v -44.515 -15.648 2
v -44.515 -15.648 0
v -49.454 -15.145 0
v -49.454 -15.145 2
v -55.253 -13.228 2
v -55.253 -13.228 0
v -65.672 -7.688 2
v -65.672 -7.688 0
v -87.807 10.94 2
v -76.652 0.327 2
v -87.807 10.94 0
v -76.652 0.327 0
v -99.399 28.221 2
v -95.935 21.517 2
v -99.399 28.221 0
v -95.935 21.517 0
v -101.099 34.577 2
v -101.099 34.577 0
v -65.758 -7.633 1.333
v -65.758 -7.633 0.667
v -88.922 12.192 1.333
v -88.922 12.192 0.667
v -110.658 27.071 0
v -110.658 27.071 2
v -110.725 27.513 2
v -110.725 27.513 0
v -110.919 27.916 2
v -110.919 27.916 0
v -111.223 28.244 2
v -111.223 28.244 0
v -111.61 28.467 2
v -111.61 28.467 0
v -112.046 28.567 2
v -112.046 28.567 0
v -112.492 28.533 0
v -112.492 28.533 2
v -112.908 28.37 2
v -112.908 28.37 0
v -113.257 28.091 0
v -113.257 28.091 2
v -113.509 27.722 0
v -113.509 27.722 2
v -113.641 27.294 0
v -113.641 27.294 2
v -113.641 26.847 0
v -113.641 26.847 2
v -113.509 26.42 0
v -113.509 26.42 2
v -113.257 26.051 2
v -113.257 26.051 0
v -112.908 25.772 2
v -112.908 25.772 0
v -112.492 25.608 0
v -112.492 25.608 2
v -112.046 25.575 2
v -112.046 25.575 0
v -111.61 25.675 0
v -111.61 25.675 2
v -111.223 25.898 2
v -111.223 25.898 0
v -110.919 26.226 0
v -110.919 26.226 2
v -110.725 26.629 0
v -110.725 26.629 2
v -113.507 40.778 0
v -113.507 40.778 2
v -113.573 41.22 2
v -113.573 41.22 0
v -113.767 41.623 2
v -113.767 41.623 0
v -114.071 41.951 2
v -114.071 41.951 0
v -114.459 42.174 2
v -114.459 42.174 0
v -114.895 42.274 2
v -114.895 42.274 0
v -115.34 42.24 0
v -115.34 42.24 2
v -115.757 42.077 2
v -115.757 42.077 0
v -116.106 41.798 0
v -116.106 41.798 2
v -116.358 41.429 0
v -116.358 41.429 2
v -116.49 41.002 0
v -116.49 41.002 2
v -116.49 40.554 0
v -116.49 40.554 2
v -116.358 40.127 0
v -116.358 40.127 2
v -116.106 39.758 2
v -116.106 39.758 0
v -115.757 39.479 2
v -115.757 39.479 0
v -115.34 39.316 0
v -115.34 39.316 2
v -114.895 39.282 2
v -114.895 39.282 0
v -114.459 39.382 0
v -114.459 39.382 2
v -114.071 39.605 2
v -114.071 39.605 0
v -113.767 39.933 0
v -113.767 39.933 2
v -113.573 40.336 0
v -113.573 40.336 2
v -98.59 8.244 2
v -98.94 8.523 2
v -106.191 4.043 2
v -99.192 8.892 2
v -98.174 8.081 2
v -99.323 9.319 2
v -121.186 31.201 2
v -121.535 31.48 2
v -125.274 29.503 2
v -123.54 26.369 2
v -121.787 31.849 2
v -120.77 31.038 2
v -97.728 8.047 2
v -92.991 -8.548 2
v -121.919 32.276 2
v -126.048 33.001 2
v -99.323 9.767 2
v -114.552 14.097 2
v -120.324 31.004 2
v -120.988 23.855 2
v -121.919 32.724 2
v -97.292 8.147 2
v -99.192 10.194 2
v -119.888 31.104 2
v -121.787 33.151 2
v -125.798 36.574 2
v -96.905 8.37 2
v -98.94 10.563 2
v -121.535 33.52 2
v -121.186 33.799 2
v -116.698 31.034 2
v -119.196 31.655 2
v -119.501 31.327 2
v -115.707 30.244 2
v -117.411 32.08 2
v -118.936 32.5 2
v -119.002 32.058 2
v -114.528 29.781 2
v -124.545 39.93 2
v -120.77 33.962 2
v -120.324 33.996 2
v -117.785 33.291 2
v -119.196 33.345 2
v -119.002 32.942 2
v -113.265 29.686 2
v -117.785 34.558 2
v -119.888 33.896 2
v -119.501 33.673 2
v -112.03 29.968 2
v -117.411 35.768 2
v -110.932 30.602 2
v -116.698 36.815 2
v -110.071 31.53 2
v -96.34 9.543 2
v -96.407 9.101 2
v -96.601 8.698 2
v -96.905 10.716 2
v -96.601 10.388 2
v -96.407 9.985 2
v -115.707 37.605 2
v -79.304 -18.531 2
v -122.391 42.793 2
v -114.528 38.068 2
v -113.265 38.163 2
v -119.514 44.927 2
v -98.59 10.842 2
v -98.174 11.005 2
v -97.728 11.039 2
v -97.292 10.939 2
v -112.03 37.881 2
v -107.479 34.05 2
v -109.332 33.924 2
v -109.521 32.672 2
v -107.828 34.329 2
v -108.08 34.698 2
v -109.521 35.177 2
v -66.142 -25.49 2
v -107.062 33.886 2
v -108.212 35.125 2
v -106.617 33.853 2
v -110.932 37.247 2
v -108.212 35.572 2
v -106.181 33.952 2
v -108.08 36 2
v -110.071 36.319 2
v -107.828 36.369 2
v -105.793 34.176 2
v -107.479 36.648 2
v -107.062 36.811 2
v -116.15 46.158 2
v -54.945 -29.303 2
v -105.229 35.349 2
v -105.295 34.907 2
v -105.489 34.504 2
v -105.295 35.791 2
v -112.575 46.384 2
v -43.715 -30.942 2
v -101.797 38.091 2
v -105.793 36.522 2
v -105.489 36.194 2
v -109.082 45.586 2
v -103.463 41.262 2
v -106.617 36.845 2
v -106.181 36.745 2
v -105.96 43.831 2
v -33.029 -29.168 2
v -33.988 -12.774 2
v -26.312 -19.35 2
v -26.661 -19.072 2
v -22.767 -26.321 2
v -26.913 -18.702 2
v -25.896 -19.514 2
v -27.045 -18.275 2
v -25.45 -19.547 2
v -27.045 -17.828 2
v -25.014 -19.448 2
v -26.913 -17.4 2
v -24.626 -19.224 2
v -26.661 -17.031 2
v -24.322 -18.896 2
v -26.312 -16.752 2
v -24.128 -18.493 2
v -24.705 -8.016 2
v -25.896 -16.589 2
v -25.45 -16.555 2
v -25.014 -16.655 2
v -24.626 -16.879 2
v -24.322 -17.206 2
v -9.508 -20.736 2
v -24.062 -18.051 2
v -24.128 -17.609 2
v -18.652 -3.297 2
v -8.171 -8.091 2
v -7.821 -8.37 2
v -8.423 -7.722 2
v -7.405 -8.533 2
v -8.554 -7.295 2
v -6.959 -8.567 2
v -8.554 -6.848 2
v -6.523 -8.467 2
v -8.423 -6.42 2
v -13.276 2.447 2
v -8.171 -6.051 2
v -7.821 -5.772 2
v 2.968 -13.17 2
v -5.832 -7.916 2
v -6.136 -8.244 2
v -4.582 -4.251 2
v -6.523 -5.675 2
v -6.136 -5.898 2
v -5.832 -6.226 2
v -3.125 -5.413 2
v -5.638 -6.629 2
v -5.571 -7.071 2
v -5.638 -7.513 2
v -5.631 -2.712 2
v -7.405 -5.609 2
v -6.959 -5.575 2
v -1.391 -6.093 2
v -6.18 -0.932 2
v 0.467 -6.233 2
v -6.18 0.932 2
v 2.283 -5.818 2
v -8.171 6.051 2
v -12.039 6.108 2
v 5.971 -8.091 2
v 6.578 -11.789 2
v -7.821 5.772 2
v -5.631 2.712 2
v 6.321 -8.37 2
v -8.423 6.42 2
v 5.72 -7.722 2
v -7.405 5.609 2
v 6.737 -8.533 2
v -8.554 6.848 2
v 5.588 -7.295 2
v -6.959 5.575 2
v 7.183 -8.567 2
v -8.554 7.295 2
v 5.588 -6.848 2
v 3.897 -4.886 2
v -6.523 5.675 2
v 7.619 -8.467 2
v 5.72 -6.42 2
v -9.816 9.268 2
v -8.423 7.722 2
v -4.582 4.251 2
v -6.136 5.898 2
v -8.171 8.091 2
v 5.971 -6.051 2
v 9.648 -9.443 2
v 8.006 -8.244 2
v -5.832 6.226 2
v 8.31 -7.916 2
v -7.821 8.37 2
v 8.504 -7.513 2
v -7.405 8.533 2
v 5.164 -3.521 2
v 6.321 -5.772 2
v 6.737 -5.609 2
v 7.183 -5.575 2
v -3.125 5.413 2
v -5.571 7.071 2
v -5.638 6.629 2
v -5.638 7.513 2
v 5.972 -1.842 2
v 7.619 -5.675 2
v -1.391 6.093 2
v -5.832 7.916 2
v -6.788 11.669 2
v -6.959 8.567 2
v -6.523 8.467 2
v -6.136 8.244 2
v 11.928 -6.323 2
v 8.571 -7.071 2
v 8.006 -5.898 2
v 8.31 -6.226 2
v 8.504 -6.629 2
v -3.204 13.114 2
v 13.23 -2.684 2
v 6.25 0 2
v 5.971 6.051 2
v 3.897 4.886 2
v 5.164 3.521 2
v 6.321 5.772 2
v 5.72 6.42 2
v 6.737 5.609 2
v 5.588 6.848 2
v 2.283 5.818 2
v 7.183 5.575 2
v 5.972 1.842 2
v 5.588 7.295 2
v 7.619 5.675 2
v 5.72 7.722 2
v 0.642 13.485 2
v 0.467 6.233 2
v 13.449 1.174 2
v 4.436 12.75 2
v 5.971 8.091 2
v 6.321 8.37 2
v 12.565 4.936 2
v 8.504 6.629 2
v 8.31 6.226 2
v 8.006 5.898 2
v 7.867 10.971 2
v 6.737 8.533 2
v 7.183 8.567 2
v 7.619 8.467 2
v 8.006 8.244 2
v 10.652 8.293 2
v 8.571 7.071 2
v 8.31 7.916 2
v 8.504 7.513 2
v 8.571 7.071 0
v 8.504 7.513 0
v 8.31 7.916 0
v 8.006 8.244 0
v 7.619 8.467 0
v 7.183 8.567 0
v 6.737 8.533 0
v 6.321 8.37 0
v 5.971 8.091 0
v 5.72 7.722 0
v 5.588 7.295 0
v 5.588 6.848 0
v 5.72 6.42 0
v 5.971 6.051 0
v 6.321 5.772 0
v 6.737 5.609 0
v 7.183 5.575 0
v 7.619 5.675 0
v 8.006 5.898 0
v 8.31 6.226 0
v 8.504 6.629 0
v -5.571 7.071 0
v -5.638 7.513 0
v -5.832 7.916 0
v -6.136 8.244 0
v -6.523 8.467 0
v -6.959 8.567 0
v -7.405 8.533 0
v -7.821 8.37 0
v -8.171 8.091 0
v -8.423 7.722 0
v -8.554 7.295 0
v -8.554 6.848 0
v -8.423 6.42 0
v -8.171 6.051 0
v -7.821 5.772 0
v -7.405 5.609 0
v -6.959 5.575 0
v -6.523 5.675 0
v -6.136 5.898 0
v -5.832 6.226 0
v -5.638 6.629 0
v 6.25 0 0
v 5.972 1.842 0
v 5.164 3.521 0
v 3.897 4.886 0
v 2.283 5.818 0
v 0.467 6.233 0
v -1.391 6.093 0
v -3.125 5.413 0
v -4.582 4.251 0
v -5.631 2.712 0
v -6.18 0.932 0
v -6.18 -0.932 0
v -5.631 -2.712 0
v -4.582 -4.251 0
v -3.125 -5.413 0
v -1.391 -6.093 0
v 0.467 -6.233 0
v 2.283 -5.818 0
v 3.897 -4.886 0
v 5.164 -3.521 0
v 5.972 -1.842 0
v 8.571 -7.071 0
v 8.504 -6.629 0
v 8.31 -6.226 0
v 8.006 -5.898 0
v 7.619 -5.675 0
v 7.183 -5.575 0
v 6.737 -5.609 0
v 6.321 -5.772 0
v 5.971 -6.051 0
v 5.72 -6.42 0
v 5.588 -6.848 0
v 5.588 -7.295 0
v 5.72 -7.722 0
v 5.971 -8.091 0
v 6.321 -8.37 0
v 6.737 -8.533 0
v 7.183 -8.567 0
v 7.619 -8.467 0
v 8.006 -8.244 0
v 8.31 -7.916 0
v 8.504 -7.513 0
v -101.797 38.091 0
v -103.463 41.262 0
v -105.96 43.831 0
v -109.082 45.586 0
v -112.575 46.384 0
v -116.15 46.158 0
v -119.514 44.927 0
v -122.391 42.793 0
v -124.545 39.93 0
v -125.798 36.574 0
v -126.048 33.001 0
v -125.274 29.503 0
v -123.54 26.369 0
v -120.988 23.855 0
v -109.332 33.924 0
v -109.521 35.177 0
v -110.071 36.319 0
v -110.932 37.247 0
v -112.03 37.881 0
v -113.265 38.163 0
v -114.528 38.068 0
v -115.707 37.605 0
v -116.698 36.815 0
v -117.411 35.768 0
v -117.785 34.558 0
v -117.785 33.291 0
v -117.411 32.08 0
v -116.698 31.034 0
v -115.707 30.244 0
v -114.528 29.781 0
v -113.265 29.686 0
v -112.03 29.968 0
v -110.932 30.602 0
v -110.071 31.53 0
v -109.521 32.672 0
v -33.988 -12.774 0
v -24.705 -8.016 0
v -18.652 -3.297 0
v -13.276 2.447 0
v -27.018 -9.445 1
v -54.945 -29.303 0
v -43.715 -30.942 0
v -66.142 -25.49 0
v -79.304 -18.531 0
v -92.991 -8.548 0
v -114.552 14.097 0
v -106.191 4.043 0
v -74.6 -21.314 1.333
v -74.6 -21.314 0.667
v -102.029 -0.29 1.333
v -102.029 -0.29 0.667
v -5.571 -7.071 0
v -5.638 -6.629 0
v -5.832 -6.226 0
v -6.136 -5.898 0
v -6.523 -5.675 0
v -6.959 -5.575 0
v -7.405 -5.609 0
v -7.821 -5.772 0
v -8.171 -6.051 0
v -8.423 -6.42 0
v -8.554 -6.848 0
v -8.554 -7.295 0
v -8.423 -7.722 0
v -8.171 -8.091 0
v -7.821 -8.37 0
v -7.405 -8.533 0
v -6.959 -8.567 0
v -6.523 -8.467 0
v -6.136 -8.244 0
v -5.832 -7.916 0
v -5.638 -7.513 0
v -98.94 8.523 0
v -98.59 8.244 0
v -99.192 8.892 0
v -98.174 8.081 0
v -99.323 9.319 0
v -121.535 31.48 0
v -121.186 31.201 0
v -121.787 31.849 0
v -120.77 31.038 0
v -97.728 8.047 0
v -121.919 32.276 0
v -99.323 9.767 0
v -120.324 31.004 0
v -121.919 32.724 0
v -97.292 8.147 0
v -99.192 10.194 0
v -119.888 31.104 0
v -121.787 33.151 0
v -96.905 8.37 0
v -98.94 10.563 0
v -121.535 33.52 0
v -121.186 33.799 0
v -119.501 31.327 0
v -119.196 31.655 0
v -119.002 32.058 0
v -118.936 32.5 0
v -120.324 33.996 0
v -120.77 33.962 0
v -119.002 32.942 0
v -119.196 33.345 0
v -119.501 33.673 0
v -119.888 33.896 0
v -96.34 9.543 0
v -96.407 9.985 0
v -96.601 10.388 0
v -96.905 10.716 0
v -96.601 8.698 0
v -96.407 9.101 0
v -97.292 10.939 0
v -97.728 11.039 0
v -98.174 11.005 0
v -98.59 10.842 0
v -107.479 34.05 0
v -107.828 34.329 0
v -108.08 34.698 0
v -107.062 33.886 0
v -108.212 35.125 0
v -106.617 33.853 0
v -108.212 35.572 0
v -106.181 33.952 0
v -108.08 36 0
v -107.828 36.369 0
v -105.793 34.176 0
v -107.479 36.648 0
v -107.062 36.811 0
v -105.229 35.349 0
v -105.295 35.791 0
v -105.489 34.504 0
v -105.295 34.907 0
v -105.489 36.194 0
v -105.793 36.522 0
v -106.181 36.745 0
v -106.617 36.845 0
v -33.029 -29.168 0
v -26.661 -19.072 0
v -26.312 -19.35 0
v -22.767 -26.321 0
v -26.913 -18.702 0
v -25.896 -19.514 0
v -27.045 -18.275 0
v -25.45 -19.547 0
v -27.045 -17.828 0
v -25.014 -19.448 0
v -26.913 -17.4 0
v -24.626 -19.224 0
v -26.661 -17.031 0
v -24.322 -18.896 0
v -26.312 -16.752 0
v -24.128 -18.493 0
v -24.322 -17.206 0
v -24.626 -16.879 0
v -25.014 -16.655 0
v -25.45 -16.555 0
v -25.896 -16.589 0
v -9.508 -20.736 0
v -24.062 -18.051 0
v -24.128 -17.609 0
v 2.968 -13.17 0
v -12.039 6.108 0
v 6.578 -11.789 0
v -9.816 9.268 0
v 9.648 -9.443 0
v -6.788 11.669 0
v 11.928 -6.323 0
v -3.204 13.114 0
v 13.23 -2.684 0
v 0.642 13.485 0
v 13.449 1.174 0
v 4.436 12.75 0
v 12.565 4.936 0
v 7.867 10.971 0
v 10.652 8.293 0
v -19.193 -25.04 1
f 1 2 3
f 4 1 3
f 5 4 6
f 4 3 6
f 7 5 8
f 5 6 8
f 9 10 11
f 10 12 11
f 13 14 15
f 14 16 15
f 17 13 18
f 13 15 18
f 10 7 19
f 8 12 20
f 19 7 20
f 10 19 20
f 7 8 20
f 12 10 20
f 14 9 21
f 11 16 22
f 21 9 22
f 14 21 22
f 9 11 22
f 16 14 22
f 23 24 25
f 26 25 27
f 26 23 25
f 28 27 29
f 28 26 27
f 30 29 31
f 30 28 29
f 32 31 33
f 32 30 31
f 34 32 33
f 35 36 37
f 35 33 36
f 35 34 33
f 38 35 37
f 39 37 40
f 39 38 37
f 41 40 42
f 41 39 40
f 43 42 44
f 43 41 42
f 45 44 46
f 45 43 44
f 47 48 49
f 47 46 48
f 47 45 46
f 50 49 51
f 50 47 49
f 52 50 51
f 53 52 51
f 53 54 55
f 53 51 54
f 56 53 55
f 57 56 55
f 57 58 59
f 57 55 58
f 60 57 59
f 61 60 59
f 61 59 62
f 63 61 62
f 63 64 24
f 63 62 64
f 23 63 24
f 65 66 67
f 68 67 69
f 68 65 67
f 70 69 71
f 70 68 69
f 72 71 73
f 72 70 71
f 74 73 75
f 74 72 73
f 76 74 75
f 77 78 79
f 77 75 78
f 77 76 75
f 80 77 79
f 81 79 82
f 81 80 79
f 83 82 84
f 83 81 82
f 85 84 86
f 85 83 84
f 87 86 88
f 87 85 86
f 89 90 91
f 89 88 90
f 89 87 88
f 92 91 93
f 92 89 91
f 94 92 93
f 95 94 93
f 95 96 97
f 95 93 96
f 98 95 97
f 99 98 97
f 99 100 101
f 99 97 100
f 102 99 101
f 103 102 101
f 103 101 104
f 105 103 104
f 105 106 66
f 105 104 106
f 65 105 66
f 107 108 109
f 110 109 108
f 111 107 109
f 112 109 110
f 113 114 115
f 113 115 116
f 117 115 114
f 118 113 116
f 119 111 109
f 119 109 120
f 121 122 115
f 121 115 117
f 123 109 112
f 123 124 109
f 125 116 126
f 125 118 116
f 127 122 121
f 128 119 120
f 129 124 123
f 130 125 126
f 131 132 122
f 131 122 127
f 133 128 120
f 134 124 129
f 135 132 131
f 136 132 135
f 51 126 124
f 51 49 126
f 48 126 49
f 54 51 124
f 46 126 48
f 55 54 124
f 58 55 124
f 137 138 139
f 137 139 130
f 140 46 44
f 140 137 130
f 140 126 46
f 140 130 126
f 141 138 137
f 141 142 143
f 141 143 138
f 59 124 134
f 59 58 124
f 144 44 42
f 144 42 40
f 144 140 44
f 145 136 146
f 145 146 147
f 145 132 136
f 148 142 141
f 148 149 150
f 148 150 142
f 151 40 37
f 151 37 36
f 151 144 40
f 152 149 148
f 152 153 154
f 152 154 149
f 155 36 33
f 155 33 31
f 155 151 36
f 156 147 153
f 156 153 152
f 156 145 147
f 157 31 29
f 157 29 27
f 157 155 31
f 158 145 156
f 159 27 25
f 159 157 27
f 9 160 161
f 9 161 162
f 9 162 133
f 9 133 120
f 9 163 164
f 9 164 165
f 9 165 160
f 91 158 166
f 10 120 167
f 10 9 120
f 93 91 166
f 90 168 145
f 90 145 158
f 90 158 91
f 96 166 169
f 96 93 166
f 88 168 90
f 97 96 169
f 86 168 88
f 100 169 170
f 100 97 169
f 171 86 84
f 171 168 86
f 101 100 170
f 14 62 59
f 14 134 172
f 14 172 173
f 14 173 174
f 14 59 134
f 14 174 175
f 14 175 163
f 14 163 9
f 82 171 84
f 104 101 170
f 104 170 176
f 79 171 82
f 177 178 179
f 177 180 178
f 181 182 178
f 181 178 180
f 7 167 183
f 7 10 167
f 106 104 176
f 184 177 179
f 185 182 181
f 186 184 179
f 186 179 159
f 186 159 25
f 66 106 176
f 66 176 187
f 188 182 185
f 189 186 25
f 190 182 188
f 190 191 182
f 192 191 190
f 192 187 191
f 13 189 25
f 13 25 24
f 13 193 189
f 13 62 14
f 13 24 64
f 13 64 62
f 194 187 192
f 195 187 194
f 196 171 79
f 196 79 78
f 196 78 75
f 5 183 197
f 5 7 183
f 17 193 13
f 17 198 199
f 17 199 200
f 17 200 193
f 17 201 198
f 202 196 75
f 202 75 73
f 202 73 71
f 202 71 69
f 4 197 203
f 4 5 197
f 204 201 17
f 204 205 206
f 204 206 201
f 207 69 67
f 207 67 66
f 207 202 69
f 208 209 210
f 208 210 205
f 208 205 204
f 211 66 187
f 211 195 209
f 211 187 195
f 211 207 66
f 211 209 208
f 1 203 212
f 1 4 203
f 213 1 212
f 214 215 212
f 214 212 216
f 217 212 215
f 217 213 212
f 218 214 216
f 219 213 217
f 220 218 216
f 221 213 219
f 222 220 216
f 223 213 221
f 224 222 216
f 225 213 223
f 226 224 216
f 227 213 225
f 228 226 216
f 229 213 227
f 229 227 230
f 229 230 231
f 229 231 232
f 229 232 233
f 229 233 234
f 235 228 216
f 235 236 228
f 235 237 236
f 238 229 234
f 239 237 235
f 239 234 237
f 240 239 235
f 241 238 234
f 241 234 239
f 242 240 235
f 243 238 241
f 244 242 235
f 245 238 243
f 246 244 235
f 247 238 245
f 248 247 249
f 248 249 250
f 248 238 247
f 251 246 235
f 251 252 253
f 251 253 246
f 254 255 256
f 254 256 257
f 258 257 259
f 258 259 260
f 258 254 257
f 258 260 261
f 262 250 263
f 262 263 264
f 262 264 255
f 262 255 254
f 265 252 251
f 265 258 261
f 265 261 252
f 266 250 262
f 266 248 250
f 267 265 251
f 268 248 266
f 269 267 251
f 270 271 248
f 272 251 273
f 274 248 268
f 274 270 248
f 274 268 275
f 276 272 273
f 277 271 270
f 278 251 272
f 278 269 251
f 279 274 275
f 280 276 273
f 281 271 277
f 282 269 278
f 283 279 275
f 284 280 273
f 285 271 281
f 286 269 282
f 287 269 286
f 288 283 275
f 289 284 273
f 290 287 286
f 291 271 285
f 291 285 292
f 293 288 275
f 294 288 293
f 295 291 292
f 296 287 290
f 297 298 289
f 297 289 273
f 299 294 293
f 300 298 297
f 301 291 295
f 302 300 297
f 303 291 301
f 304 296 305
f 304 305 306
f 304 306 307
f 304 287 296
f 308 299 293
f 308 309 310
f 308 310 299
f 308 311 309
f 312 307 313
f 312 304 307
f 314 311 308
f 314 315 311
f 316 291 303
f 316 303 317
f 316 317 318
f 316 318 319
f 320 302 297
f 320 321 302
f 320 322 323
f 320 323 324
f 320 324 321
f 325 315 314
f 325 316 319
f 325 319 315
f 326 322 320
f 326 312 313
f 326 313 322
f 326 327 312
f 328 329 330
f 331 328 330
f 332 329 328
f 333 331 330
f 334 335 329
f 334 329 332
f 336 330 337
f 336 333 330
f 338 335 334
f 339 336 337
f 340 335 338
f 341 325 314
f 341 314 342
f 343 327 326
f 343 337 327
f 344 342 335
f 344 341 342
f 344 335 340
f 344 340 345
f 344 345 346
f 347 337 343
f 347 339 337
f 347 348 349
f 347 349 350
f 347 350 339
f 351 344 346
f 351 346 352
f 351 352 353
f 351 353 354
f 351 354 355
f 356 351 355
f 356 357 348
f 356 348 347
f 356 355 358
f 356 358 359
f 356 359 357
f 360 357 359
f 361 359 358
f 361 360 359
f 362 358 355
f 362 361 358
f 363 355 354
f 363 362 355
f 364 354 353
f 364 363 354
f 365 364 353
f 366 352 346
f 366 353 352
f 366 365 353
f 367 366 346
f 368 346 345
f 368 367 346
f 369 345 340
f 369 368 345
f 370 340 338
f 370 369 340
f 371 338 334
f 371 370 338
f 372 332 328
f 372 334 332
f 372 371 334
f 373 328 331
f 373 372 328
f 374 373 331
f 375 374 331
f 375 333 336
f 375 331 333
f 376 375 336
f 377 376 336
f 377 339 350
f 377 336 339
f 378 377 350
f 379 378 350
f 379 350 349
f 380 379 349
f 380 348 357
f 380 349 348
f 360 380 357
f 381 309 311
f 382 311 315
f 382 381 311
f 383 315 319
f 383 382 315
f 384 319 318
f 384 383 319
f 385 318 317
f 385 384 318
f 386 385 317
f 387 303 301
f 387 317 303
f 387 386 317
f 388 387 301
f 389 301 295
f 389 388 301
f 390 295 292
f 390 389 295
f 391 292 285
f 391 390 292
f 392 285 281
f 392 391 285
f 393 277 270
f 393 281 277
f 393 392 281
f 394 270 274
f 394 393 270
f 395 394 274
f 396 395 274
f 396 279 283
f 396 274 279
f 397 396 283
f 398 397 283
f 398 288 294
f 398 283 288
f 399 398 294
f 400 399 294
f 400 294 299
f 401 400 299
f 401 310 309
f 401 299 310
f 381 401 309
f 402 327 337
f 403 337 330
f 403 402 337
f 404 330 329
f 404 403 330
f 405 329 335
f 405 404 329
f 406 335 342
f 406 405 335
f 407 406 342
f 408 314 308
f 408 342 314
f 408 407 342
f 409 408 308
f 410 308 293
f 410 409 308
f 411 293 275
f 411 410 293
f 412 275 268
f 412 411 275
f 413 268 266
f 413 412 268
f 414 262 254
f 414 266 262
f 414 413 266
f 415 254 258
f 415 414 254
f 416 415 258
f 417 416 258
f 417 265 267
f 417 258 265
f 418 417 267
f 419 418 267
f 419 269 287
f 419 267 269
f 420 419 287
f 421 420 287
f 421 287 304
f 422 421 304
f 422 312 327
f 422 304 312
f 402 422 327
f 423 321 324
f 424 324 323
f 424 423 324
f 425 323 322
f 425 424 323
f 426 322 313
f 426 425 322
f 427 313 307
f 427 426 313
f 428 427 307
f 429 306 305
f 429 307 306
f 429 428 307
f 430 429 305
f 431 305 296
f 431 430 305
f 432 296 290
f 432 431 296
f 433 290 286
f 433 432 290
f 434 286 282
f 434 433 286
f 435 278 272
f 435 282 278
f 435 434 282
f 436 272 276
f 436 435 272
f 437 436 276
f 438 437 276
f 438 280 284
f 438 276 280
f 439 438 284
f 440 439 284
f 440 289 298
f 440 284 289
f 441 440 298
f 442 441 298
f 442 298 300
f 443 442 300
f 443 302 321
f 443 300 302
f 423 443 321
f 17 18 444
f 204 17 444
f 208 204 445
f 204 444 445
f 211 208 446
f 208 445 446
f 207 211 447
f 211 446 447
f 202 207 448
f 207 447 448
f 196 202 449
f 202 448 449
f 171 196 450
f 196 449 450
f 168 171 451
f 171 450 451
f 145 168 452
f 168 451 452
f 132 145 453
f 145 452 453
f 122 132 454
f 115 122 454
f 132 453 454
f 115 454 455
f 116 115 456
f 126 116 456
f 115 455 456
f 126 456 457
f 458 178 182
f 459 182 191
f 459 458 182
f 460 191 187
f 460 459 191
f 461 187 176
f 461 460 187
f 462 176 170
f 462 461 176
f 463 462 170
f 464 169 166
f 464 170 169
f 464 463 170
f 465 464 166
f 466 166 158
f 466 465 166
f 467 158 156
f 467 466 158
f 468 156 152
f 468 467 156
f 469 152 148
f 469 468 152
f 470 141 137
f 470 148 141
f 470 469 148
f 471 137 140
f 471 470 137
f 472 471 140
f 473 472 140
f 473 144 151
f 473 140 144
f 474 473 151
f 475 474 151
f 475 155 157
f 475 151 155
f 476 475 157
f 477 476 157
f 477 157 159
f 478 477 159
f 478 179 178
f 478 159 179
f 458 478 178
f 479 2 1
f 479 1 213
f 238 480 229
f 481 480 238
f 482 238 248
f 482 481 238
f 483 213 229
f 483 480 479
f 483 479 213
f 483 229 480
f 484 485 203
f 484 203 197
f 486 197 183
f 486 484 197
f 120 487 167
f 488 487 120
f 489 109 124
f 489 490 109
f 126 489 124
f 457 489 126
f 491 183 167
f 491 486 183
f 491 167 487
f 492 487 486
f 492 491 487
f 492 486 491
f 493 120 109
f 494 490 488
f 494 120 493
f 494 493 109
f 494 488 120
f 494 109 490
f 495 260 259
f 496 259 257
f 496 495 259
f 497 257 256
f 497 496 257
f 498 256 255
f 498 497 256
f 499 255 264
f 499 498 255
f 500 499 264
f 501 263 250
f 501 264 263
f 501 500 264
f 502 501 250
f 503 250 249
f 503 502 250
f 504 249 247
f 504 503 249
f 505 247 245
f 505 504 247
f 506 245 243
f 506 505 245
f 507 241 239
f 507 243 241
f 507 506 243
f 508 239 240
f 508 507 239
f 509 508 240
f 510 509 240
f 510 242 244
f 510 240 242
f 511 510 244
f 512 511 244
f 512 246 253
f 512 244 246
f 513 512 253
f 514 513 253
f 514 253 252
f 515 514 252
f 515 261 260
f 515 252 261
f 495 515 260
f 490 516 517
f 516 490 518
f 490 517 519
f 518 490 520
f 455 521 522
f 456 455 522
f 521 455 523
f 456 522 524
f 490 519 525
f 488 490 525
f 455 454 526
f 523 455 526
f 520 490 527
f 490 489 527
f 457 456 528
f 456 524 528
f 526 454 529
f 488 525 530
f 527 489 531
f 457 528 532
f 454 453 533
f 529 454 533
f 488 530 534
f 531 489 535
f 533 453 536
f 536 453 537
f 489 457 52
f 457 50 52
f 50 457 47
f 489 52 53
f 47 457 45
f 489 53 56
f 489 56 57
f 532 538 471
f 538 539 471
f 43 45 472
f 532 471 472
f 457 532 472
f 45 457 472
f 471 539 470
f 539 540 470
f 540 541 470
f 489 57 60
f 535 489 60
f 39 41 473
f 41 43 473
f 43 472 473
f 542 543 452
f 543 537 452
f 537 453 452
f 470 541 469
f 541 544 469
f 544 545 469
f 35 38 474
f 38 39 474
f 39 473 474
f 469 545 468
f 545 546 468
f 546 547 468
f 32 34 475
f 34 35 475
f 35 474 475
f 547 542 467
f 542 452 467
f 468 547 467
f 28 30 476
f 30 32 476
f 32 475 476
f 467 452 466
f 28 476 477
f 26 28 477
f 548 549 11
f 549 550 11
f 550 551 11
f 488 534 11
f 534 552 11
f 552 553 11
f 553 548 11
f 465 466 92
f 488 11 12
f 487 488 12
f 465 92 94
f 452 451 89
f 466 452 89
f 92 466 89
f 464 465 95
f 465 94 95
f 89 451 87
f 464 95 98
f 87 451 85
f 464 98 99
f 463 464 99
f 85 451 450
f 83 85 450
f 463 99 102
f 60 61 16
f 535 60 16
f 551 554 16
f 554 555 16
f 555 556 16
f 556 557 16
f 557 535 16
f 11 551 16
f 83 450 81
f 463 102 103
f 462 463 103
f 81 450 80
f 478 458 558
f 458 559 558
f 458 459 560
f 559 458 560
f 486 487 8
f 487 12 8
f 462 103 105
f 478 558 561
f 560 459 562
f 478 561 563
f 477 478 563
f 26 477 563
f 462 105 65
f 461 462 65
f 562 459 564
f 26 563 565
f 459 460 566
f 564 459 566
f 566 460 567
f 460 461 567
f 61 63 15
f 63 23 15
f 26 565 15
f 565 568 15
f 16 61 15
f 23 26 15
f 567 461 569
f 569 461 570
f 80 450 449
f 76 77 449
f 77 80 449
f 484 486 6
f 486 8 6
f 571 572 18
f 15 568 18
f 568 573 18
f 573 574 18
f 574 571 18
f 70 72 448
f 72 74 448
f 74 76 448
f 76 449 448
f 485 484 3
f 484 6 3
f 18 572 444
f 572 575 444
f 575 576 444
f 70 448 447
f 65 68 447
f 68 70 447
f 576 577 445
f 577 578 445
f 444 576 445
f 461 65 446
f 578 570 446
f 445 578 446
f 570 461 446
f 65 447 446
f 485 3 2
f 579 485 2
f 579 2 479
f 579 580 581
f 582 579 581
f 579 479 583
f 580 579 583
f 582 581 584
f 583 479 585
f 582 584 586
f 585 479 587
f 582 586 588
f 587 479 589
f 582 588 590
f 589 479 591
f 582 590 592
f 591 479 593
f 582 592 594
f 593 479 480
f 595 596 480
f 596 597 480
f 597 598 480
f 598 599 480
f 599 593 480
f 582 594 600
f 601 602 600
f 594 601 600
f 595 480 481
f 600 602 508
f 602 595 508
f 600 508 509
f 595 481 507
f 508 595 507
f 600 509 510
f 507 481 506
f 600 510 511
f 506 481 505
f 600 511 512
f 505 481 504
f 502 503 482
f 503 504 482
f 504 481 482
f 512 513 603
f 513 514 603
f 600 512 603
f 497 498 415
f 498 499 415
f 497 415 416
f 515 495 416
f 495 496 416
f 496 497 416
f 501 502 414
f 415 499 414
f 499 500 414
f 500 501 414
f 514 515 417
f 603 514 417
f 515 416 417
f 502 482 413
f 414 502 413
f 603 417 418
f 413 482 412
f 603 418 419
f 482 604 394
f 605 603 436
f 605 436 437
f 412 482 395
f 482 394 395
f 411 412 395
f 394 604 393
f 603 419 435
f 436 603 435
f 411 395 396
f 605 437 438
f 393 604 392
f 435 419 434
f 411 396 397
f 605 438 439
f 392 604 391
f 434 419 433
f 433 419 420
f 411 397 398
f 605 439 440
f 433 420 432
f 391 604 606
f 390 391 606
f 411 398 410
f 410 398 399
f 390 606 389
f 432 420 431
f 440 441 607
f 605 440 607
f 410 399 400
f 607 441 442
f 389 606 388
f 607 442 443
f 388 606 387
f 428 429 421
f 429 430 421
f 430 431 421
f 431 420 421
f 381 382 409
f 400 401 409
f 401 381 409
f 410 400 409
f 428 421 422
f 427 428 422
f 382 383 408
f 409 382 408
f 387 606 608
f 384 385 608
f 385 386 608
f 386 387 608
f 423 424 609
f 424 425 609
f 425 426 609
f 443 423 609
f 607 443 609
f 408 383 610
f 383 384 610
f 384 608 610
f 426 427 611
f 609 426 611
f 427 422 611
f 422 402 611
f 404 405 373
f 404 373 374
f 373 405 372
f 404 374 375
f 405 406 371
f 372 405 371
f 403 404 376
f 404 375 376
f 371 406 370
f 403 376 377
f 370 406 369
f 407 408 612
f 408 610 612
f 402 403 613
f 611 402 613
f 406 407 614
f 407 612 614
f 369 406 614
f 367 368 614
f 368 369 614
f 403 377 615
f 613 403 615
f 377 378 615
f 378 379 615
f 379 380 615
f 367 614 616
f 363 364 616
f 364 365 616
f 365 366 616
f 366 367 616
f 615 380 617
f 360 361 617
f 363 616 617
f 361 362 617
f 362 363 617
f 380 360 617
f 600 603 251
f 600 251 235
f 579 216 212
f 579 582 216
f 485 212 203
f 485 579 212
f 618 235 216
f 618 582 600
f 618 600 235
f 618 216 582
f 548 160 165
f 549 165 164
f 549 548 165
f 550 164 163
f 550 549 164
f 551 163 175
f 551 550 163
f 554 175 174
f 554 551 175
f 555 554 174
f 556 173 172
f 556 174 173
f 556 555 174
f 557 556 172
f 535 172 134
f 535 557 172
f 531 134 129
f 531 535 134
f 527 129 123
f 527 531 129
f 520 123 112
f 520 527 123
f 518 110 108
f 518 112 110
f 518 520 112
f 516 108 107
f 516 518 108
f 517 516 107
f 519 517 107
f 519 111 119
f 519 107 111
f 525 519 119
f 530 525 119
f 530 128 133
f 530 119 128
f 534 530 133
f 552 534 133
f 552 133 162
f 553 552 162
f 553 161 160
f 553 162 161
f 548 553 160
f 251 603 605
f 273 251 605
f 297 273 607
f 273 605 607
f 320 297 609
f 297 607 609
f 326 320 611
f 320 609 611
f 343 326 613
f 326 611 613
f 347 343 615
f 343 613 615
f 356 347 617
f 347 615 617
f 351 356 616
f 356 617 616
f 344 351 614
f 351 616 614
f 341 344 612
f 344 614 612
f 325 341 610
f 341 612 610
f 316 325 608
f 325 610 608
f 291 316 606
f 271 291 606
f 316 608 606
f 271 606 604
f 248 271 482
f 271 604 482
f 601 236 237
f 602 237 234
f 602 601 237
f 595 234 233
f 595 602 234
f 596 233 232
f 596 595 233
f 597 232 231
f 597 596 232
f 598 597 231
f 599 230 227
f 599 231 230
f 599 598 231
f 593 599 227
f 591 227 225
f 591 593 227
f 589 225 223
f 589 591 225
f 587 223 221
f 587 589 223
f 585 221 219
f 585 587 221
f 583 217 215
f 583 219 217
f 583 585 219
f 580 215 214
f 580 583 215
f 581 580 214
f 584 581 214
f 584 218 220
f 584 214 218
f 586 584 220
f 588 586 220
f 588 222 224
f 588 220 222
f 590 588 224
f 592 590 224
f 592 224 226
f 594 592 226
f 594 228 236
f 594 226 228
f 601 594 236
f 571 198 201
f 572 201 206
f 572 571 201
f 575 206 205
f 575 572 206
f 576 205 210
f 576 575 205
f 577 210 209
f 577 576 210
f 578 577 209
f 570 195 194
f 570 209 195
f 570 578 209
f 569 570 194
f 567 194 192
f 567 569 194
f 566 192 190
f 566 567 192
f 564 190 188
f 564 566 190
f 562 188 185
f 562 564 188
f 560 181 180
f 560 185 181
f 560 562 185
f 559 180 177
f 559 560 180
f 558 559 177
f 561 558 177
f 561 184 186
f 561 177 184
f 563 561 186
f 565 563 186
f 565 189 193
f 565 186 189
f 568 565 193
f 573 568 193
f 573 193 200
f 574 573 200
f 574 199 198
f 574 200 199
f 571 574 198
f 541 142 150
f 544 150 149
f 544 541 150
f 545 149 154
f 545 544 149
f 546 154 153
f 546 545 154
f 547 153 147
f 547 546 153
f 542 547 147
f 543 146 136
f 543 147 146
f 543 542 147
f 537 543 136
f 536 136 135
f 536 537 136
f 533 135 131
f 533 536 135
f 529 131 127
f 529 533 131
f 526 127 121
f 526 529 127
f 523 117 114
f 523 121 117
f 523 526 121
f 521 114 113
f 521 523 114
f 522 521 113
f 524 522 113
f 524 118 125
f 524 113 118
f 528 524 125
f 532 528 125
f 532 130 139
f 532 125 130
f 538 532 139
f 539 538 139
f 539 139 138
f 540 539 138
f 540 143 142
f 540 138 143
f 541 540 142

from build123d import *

# Parameters (mm, degrees)
SKETCH_1_R          = 13.5
EXTRUDE_1_DEPTH     = 2
SKETCH_2_R          = 6.25
SKETCH_2_R_2        = 1.5
SKETCH_2_R_3        = 4.25
CUT_EXTRUDE_2_DEPTH = 135.372484569
SKETCH_3_R          = 1.5
CUT_EXTRUDE_3_DEPTH = 135.372484569


with BuildPart() as part:
    # 草图1 → 凸台-拉伸1 (new body)
    with BuildSketch(Plane.XY):
        Circle(SKETCH_1_R)
        with BuildLine():
            ThreePointArc((5.892711217, -11.0238811), (8.326059469, 9.323450741), (-11.617581648, 4.613219771))
            add(Edge.make_bspline(
                [(-44.514894976, -15.648119029), (-23.754992487, -12.049932399), (-11.617581648, 4.613219771)],
                knots=[0, 0, 0, 1, 1, 1], degree=2))
            add(Edge.make_bspline(
                [(-44.514894976, -15.648119029), (-60.493246192, -16.620966096), (-98.719374485, 13.99401616), (-101.099323327, 34.577284328)],
                knots=[0, 0, 0, 0, 1, 1, 1, 1], degree=3))
            ThreePointArc((-101.099323327, 34.577284328), (-119.514224633, 44.92723863), (-120.988196928, 23.854565571))
            add(Edge.make_bspline(
                [(-43.715031798, -30.941916126), (-74.6558876, -29.772176263), (-107.934743734, 0.909272839), (-120.988196928, 23.854565571)],
                knots=[0, 0, 0, 0, 1, 1, 1, 1], degree=3))
            add(Edge.make_bspline(
                [(5.892711217, -11.0238811), (-16.208282922, -27.819747246), (-43.715031798, -30.941916126)],
                knots=[0, 0, 0, 1, 1, 1], degree=2))
        make_face()
    extrude(amount=EXTRUDE_1_DEPTH)

    # 草图2 → 切除-拉伸2 (cut, through all)
    with BuildSketch(Plane.XY):
        Circle(SKETCH_2_R)
        with Locations((-7.071067812, 7.071067812)):
            Circle(SKETCH_2_R_2)
        with Locations((7.071067812, 7.071067812)):
            Circle(SKETCH_2_R_2)
        with Locations((7.071067812, -7.071067812)):
            Circle(SKETCH_2_R_2)
        with Locations((-7.071067812, -7.071067812)):
            Circle(SKETCH_2_R_2)
        with Locations((-113.582262859, 33.924428557)):
            Circle(SKETCH_2_R_3)
        with Locations((-106.728711554, 35.34880018)):
            Circle(SKETCH_2_R_2)
        with Locations((-112.157891236, 27.070877253)):
            Circle(SKETCH_2_R_2)
        with Locations((-120.435814163, 32.500056934)):
            Circle(SKETCH_2_R_2)
        with Locations((-115.006634481, 40.777979862)):
            Circle(SKETCH_2_R_2)
    extrude(amount=CUT_EXTRUDE_2_DEPTH, mode=Mode.SUBTRACT)

    # 草图3 → 切除-拉伸3 (cut, through all)
    with BuildSketch(Plane.XY):
        with Locations((-97.840235061, 9.542968429)):
            Circle(SKETCH_3_R)
        with Locations((-25.561724323, -18.05130401)):
            Circle(SKETCH_3_R)
    extrude(amount=CUT_EXTRUDE_3_DEPTH, mode=Mode.SUBTRACT)


solid = part.part
